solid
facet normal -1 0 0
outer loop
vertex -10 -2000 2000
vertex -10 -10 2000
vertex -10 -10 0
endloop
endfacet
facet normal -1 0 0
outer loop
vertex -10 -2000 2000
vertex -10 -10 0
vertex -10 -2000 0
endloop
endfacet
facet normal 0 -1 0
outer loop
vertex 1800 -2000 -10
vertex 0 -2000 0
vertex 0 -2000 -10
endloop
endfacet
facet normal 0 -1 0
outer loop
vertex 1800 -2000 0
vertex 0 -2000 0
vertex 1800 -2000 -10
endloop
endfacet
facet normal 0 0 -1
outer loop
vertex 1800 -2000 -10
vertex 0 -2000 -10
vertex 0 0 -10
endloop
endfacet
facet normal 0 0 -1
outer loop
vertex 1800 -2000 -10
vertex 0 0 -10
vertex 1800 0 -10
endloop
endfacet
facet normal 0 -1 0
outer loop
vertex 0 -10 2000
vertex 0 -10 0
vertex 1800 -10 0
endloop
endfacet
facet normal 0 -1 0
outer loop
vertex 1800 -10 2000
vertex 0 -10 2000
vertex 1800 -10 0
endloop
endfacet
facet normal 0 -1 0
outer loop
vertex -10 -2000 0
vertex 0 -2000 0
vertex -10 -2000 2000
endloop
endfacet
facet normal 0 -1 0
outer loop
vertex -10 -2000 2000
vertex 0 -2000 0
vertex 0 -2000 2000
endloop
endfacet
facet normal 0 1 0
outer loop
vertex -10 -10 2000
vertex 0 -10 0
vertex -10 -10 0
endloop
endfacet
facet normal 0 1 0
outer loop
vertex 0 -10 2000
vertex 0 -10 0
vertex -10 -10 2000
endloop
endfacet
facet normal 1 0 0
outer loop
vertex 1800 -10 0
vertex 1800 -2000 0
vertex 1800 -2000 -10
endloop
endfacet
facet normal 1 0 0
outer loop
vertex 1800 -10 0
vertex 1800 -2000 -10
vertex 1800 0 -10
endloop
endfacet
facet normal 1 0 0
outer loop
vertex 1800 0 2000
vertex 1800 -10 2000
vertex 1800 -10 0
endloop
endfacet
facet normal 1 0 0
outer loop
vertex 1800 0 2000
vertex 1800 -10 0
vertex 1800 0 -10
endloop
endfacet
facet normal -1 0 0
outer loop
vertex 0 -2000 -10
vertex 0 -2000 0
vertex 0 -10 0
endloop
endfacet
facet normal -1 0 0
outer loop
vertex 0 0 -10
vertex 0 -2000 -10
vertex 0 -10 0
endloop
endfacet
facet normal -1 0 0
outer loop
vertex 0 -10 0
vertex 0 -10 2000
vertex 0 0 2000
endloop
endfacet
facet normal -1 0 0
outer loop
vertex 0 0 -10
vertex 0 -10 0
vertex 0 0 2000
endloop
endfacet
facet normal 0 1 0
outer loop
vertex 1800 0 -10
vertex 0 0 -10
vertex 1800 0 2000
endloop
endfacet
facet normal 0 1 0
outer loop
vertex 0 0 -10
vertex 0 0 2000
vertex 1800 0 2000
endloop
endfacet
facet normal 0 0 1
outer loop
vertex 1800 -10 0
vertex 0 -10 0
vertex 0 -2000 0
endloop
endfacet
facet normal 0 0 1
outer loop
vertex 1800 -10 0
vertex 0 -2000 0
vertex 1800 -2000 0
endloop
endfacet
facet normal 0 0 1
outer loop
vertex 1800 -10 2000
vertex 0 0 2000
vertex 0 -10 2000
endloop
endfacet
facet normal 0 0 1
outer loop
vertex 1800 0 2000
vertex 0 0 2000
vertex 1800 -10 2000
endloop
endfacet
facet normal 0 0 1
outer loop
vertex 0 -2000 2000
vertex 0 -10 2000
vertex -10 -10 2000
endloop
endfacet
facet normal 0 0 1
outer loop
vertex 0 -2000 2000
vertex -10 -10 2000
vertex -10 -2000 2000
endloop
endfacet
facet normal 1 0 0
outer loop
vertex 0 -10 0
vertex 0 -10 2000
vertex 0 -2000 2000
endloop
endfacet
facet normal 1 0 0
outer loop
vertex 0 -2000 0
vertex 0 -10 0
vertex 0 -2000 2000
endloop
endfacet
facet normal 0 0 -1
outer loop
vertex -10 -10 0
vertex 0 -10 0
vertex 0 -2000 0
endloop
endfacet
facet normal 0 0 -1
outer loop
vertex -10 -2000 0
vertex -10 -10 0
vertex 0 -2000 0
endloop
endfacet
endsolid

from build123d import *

# Parameters (mm, degrees)
F2_W     = 1800
F2_H     = 2000
F3_DEPTH = 10
F0_W     = 1800
F0_H     = 2000
F4_DEPTH = 10
F5_W     = 1990
F5_H     = 2000
F1_DEPTH = 10


with BuildPart() as f3:
    # F2 (on Front) → F3 (new body)
    with BuildSketch(Plane.XZ):
        with Locations((900, 1000)):
            Rectangle(F2_W, F2_H)
    extrude(amount=F3_DEPTH)

    # F0 (on Top) → F4 (join)
    with BuildSketch(Plane.XY):
        with Locations((900, -1000)):
            Rectangle(F0_W, F0_H)
    extrude(amount=-F4_DEPTH)


with BuildPart() as f1:
    # F5 (on face) → F1 (new body)
    with BuildSketch(Plane(origin=(0, 0, 0), x_dir=(0, -1, 0), z_dir=(-1, 0, 0))):
        with Locations((1005, 1000)):
            Rectangle(F5_W, F5_H)
    extrude(amount=F1_DEPTH)


solid = Compound([f3.part, f1.part])
